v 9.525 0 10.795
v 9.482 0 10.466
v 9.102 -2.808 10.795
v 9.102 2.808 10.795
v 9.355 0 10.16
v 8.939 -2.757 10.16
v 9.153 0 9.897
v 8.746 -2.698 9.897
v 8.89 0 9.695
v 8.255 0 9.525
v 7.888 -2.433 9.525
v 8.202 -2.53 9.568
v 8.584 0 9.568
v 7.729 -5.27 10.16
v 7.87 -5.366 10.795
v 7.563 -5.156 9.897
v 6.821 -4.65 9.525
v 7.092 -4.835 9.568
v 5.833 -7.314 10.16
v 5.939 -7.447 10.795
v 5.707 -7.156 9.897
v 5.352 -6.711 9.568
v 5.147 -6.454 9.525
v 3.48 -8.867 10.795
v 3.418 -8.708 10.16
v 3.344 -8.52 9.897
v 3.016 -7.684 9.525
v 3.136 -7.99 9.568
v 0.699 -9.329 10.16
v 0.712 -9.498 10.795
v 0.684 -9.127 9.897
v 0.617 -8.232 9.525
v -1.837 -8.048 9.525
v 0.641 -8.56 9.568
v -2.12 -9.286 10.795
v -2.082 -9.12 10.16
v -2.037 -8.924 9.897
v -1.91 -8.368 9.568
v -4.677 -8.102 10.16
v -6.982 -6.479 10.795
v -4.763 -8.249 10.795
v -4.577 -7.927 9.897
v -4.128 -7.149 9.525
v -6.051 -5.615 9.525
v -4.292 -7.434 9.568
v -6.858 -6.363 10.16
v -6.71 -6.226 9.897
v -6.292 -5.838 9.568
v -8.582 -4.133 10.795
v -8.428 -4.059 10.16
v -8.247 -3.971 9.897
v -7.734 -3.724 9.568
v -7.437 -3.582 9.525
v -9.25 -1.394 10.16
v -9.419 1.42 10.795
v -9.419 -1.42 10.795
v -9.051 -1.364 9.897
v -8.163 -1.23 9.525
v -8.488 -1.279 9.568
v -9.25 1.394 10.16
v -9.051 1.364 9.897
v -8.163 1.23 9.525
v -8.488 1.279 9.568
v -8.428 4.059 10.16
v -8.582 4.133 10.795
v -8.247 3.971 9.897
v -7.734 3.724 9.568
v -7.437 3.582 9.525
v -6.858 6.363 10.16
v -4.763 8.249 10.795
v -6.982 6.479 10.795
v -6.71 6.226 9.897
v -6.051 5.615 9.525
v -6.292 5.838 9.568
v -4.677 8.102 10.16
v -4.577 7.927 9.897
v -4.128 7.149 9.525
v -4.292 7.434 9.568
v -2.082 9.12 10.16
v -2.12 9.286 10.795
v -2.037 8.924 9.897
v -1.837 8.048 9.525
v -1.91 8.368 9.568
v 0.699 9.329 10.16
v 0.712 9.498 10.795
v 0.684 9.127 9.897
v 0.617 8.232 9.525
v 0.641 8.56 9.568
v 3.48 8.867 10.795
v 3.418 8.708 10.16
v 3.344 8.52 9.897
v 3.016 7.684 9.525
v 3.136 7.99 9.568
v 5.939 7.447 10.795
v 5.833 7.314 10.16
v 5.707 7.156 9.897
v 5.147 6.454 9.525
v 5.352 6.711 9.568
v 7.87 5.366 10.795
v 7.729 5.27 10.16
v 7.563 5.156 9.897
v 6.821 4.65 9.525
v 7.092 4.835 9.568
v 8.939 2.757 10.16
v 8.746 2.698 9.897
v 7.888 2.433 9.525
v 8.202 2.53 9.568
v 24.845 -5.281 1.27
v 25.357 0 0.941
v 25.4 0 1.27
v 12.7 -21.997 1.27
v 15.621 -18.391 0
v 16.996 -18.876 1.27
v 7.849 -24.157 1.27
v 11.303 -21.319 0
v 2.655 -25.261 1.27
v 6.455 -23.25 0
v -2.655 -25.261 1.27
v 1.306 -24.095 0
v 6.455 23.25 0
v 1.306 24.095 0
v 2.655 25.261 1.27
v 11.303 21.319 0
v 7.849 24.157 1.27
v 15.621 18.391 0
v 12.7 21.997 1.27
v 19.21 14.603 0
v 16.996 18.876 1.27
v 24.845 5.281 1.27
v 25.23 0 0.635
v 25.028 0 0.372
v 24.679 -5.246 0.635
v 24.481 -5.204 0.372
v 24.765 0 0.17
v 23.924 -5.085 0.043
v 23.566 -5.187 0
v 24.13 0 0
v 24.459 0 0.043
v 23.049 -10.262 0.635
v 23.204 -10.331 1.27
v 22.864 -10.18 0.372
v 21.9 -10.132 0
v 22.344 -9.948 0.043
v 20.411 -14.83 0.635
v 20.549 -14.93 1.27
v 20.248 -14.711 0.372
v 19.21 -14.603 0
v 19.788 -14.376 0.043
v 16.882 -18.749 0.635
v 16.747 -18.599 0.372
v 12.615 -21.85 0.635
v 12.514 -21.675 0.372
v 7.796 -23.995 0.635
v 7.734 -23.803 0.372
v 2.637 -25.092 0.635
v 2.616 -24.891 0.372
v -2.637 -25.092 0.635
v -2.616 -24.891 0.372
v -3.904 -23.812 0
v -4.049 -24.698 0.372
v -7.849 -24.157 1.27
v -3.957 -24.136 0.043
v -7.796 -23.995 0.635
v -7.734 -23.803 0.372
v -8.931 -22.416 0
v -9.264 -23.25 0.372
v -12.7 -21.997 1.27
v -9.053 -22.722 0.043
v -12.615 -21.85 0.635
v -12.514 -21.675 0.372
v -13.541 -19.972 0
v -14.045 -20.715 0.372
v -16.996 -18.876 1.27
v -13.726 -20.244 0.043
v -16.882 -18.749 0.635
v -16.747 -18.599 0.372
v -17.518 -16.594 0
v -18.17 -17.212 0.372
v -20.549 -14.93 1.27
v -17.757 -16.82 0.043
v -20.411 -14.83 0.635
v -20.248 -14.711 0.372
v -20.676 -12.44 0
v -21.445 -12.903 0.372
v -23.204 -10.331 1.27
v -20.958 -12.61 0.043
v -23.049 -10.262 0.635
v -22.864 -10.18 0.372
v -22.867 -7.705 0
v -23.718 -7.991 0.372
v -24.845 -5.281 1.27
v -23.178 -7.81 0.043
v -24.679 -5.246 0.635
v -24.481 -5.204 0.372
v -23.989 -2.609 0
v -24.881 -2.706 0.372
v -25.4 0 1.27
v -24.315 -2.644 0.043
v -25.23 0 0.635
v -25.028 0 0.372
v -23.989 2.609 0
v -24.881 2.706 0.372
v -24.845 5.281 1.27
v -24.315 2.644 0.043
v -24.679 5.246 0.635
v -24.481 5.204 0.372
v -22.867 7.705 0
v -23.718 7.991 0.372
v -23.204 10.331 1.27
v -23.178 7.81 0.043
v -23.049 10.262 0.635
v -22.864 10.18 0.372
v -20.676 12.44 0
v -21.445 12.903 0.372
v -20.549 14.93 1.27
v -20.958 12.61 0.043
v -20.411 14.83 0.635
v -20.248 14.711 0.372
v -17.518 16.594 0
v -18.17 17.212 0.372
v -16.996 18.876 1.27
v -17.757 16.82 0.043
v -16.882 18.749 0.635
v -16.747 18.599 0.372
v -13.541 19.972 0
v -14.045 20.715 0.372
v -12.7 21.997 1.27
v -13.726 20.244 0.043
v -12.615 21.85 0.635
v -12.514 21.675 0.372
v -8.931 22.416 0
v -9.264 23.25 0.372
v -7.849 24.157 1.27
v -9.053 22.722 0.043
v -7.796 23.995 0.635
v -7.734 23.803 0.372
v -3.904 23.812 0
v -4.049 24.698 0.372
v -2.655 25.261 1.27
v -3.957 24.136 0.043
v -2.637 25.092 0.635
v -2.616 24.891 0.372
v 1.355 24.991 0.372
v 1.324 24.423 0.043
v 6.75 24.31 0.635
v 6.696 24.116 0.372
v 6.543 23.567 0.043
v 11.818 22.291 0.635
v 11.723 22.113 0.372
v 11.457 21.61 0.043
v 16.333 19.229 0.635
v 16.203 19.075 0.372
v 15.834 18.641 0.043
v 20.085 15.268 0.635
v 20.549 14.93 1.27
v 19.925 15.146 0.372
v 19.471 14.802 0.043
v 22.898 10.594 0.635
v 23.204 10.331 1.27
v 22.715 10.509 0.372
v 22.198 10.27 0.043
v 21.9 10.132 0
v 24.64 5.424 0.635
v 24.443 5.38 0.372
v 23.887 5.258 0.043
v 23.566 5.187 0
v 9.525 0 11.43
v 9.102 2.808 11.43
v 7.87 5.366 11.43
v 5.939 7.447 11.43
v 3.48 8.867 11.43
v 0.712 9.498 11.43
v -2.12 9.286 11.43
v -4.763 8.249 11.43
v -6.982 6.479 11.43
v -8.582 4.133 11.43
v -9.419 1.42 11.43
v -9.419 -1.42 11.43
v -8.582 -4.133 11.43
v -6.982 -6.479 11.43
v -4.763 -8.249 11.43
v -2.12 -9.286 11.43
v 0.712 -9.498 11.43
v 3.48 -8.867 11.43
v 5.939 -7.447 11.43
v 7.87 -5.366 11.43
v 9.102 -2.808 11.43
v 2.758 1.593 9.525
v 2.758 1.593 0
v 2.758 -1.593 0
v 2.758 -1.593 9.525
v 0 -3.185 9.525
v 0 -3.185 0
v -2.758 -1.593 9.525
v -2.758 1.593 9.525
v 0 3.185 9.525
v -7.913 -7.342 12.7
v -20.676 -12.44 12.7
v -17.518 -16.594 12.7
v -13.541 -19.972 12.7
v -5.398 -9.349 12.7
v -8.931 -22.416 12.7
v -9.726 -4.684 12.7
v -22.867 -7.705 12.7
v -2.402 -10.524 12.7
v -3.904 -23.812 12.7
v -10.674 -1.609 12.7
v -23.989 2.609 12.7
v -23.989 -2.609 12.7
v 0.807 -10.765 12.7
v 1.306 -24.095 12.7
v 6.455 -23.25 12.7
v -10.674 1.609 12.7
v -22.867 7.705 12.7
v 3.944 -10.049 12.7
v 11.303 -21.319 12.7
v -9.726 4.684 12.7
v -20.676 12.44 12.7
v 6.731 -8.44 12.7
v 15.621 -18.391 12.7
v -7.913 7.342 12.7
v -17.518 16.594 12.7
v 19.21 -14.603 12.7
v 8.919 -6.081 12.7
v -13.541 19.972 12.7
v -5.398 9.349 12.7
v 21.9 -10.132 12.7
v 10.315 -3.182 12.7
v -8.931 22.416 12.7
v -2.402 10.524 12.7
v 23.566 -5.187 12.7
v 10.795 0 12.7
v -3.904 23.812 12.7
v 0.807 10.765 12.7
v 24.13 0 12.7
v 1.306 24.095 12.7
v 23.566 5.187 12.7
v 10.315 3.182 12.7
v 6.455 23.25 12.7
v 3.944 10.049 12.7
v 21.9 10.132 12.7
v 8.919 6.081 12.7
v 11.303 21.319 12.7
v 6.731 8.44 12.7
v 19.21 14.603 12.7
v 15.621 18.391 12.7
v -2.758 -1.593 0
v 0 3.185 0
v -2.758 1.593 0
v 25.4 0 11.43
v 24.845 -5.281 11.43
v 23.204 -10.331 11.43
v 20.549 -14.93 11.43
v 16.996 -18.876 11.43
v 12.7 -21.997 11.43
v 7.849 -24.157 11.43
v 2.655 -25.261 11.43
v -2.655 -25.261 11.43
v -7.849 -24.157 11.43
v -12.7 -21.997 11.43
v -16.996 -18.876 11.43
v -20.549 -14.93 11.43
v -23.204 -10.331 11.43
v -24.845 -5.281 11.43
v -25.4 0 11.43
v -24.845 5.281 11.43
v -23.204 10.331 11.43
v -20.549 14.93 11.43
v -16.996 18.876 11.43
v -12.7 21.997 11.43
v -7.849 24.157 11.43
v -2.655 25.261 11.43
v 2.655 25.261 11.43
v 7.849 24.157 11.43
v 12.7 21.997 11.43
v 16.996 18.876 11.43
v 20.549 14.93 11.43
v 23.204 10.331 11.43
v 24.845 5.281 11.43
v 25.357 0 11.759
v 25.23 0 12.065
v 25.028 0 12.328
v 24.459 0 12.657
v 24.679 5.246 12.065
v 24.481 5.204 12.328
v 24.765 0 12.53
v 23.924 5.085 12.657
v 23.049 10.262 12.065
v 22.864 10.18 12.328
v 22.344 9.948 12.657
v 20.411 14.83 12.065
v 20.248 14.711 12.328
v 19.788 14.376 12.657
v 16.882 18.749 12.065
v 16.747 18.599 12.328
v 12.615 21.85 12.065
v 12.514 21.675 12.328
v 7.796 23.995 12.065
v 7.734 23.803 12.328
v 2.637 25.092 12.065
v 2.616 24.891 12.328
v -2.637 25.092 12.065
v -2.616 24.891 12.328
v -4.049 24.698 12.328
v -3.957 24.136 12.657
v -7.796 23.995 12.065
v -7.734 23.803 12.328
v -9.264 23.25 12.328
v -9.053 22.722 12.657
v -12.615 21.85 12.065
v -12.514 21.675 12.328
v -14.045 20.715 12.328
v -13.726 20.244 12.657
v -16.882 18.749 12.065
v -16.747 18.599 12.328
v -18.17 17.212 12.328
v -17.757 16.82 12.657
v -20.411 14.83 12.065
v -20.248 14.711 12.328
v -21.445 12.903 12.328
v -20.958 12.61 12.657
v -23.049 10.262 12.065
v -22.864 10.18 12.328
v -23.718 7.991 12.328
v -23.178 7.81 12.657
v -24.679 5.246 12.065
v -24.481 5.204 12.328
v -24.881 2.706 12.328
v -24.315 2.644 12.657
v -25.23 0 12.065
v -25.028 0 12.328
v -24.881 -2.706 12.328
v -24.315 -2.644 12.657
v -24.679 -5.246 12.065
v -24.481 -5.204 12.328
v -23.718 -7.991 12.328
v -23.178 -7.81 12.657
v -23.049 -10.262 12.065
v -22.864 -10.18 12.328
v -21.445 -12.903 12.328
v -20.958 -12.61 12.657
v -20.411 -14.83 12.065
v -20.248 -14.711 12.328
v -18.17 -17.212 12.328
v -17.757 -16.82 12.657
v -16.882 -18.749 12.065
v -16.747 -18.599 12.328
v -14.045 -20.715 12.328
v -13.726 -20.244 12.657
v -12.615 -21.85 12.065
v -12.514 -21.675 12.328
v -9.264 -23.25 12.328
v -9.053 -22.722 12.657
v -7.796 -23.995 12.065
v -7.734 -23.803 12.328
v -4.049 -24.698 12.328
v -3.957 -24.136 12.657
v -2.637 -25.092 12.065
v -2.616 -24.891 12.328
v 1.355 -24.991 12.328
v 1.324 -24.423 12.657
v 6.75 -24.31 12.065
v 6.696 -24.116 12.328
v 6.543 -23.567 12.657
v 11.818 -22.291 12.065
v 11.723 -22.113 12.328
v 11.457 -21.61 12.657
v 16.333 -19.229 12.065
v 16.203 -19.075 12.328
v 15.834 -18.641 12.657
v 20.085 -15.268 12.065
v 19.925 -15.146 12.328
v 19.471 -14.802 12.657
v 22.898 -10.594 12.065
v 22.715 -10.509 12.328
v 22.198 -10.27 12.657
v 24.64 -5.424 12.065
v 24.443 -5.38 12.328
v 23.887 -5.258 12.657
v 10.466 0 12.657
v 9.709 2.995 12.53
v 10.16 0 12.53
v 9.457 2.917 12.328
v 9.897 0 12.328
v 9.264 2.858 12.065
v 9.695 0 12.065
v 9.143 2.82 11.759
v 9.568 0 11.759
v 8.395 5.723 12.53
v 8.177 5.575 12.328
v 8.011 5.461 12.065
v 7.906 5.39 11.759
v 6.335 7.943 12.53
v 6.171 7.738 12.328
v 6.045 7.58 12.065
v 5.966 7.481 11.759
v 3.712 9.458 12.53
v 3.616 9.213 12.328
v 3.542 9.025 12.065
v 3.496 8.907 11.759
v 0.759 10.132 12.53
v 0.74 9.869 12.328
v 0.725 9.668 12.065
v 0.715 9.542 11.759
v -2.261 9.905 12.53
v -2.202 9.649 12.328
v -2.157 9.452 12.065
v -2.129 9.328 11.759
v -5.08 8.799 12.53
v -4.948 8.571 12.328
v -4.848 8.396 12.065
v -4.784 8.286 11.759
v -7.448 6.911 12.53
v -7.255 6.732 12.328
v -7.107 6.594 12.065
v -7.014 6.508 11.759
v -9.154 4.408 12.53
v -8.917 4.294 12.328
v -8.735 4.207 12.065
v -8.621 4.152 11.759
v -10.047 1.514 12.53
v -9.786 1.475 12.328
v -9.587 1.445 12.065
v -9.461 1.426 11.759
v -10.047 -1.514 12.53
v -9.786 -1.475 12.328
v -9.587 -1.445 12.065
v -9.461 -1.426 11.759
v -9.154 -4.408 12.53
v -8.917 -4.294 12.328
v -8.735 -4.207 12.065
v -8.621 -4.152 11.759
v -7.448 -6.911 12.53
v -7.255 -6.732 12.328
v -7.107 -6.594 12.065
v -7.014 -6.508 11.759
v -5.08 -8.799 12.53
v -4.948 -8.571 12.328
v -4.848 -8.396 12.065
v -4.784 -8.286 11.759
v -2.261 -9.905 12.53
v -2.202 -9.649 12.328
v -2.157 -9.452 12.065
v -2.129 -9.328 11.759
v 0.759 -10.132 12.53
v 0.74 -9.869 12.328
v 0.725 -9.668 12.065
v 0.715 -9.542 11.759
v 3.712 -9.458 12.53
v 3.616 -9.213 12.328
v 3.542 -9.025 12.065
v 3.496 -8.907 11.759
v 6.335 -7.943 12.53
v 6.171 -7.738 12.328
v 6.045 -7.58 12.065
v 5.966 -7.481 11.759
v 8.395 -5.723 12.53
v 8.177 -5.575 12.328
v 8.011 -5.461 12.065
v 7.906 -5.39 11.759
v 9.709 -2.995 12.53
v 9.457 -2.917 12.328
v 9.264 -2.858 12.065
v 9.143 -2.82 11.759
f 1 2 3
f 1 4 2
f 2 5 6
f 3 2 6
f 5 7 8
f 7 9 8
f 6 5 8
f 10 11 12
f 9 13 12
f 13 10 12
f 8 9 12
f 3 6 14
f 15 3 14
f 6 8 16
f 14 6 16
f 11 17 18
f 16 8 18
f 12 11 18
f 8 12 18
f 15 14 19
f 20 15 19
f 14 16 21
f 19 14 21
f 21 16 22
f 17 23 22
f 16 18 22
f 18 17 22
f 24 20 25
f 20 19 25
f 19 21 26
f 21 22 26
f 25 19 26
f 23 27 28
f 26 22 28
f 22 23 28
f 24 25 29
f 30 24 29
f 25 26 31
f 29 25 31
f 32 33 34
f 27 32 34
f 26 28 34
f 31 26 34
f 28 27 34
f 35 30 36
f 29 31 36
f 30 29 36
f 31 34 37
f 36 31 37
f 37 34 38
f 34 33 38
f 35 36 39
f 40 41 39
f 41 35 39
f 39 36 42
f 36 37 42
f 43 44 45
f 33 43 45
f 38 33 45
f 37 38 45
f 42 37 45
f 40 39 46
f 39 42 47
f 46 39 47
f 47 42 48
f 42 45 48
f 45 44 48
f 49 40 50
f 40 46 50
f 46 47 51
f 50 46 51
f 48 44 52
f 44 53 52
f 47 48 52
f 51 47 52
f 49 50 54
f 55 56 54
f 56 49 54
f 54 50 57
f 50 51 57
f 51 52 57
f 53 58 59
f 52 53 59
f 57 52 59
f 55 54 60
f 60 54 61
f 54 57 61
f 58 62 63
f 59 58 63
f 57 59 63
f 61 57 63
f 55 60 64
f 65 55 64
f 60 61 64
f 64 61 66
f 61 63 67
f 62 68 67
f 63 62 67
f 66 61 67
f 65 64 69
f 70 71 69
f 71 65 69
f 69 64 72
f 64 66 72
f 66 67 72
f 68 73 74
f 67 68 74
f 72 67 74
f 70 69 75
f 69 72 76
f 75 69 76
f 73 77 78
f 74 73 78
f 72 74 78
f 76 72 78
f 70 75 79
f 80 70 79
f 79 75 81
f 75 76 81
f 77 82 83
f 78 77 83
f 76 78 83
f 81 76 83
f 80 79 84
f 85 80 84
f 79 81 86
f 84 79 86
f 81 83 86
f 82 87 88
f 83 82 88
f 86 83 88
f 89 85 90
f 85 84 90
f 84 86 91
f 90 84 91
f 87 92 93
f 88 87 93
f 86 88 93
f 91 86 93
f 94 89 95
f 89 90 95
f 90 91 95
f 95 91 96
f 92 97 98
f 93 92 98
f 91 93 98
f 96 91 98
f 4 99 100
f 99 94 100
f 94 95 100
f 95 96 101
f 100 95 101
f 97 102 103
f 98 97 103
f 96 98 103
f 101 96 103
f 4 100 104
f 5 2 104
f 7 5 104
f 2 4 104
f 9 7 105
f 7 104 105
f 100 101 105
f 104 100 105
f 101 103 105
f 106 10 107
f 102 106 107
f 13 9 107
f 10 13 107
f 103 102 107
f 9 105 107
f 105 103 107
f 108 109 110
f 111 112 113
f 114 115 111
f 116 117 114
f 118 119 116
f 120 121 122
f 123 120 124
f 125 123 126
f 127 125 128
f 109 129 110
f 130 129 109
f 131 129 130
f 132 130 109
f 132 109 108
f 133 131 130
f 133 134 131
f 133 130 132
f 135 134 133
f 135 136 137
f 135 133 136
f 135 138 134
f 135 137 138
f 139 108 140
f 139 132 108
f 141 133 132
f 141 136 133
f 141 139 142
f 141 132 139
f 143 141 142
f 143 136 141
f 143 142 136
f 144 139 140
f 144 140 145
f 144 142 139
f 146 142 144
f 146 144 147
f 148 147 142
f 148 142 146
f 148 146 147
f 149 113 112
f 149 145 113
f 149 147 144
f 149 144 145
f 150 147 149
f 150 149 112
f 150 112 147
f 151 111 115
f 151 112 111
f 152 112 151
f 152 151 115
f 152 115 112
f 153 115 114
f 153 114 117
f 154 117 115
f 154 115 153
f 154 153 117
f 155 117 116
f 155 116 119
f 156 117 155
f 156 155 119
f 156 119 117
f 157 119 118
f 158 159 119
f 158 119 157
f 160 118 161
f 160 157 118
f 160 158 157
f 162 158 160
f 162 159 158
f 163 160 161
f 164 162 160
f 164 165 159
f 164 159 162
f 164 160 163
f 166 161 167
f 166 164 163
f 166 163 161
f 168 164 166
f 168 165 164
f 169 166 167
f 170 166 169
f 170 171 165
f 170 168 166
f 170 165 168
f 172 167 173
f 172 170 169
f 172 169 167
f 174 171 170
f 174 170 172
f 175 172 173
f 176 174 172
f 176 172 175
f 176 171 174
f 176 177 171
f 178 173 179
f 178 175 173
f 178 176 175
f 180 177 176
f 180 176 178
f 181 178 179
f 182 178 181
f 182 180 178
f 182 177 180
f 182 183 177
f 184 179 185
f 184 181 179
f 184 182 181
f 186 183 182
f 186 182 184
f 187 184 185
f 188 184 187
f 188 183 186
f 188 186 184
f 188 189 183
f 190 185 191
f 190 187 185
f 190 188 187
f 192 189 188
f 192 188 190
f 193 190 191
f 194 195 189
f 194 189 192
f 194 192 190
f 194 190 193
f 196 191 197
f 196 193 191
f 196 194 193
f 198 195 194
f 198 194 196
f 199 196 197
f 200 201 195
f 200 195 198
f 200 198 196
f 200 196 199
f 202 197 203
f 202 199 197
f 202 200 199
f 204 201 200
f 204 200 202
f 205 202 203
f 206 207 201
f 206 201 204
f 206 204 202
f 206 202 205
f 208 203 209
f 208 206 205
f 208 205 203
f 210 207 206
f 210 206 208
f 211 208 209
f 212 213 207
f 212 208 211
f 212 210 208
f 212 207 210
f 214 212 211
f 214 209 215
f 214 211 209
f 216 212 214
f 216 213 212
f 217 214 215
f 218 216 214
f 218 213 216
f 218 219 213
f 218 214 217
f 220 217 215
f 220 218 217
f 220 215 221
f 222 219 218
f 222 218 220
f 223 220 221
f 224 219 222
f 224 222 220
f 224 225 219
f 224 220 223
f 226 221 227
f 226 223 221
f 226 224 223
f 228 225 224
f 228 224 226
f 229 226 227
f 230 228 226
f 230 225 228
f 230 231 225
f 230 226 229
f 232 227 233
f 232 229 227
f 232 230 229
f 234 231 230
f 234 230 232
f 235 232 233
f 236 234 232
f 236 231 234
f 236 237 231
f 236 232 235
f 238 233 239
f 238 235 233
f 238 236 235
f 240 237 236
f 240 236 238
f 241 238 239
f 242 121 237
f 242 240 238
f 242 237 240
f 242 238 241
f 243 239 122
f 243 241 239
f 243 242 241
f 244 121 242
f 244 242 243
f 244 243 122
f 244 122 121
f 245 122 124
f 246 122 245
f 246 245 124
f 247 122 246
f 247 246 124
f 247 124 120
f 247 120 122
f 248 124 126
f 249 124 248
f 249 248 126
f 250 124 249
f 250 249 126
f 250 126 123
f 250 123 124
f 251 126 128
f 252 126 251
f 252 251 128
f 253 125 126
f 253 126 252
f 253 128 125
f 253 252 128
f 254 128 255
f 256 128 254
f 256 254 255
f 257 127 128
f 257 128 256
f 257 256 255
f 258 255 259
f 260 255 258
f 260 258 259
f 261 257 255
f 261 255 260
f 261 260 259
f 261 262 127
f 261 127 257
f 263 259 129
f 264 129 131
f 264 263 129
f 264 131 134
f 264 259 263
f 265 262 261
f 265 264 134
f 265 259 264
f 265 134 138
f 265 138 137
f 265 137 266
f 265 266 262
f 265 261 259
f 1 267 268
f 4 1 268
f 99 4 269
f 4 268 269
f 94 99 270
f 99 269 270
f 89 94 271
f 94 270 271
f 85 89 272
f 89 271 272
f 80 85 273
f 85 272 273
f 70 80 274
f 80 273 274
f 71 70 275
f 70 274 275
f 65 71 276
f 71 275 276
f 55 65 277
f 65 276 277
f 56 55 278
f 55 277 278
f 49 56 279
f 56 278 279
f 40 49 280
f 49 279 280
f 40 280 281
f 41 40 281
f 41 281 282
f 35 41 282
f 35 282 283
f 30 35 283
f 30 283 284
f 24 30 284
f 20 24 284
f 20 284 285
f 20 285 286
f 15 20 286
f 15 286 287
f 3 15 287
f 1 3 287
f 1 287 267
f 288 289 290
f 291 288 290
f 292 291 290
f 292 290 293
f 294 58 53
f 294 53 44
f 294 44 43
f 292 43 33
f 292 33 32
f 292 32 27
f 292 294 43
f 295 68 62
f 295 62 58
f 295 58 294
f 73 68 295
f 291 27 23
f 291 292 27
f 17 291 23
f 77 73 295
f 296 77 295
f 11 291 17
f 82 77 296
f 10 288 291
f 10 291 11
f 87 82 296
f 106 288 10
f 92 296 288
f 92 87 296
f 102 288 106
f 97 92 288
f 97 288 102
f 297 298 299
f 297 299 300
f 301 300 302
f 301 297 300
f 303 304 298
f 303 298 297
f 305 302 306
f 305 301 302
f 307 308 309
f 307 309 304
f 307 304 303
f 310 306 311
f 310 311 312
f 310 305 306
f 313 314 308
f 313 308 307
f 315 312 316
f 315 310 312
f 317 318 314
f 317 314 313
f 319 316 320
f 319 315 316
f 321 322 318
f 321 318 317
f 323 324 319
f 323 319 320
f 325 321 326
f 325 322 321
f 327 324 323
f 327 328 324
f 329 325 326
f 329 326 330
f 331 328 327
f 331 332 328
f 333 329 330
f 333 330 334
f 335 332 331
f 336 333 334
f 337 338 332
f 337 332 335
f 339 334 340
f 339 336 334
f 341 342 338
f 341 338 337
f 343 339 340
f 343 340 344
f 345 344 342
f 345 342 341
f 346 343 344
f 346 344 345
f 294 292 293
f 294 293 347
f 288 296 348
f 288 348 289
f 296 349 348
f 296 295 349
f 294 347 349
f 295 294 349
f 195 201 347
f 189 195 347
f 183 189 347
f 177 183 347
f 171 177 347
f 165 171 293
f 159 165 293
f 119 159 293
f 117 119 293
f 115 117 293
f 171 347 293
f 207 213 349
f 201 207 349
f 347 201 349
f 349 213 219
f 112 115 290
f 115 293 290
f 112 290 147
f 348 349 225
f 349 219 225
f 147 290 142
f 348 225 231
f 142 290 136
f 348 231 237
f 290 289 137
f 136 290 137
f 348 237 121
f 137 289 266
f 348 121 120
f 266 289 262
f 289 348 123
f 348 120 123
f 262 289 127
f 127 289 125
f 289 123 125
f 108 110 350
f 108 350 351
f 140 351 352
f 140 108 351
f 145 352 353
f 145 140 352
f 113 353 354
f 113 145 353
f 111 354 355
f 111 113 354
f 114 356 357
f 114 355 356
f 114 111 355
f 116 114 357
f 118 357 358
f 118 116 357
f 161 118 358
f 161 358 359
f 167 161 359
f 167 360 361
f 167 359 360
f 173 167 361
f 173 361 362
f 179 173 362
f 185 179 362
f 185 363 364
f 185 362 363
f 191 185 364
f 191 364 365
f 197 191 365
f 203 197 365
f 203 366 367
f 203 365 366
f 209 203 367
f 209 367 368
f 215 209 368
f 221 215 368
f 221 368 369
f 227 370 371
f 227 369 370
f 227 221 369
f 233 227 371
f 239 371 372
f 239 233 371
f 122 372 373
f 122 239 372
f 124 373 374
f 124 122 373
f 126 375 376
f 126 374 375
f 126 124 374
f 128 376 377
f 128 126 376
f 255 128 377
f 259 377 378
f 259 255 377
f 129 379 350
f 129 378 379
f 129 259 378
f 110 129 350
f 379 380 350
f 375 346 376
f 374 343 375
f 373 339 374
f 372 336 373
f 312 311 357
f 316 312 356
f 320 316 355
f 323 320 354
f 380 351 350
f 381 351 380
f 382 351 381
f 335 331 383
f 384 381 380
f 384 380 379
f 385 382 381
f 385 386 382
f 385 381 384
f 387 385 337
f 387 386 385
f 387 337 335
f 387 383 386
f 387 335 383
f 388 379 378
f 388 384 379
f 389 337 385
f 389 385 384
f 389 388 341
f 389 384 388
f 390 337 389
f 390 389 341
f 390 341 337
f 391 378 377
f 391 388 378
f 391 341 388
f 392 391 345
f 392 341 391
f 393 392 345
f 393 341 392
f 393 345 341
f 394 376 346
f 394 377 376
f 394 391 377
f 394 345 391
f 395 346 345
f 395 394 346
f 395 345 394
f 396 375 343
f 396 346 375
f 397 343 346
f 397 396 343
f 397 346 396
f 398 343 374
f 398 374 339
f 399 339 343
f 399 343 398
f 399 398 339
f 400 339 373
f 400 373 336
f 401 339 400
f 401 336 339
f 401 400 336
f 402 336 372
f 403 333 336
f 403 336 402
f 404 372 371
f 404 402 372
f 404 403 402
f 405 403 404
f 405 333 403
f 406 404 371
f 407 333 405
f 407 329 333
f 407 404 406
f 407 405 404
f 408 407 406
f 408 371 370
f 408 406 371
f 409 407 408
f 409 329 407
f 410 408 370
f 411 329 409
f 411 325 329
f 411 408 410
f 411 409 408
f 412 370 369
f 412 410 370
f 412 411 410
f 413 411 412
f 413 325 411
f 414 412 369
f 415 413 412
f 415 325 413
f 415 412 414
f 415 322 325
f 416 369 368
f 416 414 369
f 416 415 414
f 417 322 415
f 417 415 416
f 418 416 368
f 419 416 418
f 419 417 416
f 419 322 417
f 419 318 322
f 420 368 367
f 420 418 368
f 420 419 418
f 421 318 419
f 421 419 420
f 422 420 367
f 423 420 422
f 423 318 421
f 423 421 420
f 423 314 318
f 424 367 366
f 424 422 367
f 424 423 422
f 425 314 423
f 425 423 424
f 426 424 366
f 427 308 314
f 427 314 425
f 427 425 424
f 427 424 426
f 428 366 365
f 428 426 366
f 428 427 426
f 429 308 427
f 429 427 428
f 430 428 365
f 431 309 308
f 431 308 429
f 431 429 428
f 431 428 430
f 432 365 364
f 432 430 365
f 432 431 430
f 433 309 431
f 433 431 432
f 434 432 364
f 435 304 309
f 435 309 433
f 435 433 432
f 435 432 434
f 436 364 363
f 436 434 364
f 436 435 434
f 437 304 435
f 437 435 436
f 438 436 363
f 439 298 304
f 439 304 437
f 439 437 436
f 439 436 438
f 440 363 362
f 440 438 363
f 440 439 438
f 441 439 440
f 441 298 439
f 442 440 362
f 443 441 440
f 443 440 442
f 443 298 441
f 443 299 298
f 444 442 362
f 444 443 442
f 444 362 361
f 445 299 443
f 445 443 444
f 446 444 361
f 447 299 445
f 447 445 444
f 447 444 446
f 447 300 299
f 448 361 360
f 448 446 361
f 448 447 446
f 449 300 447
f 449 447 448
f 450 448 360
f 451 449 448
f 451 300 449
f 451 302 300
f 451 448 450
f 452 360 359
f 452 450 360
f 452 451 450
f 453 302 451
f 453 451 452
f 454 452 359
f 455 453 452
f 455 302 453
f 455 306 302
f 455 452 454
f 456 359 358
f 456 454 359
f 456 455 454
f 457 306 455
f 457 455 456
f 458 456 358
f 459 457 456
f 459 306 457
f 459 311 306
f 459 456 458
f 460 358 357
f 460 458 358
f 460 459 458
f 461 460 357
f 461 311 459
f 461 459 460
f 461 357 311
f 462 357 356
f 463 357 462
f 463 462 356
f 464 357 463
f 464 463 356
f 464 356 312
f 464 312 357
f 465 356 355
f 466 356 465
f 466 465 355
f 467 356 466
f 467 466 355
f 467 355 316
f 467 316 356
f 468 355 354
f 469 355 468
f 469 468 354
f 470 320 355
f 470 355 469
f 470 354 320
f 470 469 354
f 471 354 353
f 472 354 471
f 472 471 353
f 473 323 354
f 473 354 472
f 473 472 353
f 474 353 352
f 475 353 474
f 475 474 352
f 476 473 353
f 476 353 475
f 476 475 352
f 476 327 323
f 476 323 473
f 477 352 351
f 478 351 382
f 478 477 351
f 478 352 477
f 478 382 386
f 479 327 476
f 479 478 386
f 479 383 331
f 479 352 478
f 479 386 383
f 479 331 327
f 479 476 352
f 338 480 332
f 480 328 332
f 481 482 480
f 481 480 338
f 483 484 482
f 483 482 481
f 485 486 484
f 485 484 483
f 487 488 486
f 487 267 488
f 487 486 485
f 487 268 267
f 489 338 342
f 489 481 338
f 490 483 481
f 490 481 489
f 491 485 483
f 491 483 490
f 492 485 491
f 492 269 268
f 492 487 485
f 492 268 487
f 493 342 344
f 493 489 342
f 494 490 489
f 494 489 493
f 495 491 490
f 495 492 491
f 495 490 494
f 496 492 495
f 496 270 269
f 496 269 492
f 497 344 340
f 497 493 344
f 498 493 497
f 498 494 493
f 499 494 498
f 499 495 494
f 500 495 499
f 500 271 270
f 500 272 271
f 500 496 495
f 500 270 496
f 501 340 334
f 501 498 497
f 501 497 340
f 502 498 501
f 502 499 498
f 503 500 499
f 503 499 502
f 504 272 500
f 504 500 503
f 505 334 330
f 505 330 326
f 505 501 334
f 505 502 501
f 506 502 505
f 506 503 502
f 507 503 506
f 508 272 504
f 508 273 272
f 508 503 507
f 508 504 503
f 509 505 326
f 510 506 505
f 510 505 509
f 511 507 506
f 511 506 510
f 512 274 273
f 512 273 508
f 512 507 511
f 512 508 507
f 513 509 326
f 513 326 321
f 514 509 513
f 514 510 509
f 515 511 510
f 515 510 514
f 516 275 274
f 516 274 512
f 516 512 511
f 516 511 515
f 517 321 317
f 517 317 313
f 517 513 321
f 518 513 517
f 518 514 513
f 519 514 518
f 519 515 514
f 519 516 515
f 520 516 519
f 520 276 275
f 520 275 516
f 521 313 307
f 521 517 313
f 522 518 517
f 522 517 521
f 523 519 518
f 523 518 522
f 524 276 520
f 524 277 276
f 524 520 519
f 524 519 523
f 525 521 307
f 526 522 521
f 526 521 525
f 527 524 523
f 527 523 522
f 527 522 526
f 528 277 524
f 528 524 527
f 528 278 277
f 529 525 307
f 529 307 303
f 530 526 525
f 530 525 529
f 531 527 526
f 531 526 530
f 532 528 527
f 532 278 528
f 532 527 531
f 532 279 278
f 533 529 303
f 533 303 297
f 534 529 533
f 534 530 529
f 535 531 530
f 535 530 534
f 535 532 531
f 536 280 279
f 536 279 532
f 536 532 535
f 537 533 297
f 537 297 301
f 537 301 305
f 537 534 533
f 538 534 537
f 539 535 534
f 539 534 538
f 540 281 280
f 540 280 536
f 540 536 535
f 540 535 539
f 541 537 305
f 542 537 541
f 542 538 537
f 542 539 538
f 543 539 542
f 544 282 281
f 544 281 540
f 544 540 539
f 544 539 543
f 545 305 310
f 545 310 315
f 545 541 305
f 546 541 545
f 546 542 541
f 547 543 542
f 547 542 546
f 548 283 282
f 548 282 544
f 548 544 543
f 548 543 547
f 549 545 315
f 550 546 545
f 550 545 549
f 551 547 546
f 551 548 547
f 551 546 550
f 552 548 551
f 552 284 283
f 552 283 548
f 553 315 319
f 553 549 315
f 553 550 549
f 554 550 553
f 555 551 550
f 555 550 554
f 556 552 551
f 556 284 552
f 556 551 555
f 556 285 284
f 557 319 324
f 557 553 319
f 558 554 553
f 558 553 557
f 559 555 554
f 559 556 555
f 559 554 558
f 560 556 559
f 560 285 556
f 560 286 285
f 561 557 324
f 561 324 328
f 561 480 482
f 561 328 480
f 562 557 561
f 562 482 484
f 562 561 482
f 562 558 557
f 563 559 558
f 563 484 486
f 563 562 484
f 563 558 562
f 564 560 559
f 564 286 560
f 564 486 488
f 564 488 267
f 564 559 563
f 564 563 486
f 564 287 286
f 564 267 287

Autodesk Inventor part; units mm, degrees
ref_plane "YZ Plane" through (0, 0, 0) normal (1, 0, 0) x (0, 1, 0)
ref_plane "XZ Plane" through (0, 0, 0) normal (0, 1, 0) x (-1, 0, 0)
ref_plane "XY Plane" through (0, 0, 0) normal (0, 0, 1) x (1, 0, 0)
sketch "Sketch1" plane through (0, 0, 0) normal (0, 0, 1) x (1, 0, 0)
  circle A0 centre (0, 0) radius 25.4
  dimension "d0" = 50.8
extrude "Extrusion1" add sketch "Sketch1" along normal blind 12.7
sketch "Sketch2" plane through (0, 0, 12.7) normal (0, 0, 1) x (1, 0, 0)
  line L0 (0, 3.1852) -> (2.7584, 1.5926)
  line L1 (2.7584, 1.5926) -> (2.7584, -1.5926)
  line L2 (2.7584, -1.5926) -> (0, -3.1852)
  line L3 (0, -3.1852) -> (-2.7584, -1.5926)
  line L4 (-2.7584, -1.5926) -> (-2.7584, 1.5926)
  line L5 (-2.7584, 1.5926) -> (0, 3.1852)
  point P0 (0, 0)
  point P1 (0, 0)
  dimension "d3" = 3.1852
extrude "Extrusion2" cut sketch "Sketch2" against normal through all
sketch "Sketch3" plane through (0, 0, 12.7) normal (0, 0, 1) x (1, 0, 0)
  circle A0 centre (0, 0) radius 9.525
  dimension "d6" = 19.05
extrude "Extrusion3" cut sketch "Sketch3" against normal blind 3.175
fillet "Fillet3" radius 1.27 4 edges at (-25.4, 0, 12.7) (-25.4, 0, 0) (-9.525, 0, 12.7) (-9.525, 0, 9.525)
properties part number "BallShooterWheel000105"
